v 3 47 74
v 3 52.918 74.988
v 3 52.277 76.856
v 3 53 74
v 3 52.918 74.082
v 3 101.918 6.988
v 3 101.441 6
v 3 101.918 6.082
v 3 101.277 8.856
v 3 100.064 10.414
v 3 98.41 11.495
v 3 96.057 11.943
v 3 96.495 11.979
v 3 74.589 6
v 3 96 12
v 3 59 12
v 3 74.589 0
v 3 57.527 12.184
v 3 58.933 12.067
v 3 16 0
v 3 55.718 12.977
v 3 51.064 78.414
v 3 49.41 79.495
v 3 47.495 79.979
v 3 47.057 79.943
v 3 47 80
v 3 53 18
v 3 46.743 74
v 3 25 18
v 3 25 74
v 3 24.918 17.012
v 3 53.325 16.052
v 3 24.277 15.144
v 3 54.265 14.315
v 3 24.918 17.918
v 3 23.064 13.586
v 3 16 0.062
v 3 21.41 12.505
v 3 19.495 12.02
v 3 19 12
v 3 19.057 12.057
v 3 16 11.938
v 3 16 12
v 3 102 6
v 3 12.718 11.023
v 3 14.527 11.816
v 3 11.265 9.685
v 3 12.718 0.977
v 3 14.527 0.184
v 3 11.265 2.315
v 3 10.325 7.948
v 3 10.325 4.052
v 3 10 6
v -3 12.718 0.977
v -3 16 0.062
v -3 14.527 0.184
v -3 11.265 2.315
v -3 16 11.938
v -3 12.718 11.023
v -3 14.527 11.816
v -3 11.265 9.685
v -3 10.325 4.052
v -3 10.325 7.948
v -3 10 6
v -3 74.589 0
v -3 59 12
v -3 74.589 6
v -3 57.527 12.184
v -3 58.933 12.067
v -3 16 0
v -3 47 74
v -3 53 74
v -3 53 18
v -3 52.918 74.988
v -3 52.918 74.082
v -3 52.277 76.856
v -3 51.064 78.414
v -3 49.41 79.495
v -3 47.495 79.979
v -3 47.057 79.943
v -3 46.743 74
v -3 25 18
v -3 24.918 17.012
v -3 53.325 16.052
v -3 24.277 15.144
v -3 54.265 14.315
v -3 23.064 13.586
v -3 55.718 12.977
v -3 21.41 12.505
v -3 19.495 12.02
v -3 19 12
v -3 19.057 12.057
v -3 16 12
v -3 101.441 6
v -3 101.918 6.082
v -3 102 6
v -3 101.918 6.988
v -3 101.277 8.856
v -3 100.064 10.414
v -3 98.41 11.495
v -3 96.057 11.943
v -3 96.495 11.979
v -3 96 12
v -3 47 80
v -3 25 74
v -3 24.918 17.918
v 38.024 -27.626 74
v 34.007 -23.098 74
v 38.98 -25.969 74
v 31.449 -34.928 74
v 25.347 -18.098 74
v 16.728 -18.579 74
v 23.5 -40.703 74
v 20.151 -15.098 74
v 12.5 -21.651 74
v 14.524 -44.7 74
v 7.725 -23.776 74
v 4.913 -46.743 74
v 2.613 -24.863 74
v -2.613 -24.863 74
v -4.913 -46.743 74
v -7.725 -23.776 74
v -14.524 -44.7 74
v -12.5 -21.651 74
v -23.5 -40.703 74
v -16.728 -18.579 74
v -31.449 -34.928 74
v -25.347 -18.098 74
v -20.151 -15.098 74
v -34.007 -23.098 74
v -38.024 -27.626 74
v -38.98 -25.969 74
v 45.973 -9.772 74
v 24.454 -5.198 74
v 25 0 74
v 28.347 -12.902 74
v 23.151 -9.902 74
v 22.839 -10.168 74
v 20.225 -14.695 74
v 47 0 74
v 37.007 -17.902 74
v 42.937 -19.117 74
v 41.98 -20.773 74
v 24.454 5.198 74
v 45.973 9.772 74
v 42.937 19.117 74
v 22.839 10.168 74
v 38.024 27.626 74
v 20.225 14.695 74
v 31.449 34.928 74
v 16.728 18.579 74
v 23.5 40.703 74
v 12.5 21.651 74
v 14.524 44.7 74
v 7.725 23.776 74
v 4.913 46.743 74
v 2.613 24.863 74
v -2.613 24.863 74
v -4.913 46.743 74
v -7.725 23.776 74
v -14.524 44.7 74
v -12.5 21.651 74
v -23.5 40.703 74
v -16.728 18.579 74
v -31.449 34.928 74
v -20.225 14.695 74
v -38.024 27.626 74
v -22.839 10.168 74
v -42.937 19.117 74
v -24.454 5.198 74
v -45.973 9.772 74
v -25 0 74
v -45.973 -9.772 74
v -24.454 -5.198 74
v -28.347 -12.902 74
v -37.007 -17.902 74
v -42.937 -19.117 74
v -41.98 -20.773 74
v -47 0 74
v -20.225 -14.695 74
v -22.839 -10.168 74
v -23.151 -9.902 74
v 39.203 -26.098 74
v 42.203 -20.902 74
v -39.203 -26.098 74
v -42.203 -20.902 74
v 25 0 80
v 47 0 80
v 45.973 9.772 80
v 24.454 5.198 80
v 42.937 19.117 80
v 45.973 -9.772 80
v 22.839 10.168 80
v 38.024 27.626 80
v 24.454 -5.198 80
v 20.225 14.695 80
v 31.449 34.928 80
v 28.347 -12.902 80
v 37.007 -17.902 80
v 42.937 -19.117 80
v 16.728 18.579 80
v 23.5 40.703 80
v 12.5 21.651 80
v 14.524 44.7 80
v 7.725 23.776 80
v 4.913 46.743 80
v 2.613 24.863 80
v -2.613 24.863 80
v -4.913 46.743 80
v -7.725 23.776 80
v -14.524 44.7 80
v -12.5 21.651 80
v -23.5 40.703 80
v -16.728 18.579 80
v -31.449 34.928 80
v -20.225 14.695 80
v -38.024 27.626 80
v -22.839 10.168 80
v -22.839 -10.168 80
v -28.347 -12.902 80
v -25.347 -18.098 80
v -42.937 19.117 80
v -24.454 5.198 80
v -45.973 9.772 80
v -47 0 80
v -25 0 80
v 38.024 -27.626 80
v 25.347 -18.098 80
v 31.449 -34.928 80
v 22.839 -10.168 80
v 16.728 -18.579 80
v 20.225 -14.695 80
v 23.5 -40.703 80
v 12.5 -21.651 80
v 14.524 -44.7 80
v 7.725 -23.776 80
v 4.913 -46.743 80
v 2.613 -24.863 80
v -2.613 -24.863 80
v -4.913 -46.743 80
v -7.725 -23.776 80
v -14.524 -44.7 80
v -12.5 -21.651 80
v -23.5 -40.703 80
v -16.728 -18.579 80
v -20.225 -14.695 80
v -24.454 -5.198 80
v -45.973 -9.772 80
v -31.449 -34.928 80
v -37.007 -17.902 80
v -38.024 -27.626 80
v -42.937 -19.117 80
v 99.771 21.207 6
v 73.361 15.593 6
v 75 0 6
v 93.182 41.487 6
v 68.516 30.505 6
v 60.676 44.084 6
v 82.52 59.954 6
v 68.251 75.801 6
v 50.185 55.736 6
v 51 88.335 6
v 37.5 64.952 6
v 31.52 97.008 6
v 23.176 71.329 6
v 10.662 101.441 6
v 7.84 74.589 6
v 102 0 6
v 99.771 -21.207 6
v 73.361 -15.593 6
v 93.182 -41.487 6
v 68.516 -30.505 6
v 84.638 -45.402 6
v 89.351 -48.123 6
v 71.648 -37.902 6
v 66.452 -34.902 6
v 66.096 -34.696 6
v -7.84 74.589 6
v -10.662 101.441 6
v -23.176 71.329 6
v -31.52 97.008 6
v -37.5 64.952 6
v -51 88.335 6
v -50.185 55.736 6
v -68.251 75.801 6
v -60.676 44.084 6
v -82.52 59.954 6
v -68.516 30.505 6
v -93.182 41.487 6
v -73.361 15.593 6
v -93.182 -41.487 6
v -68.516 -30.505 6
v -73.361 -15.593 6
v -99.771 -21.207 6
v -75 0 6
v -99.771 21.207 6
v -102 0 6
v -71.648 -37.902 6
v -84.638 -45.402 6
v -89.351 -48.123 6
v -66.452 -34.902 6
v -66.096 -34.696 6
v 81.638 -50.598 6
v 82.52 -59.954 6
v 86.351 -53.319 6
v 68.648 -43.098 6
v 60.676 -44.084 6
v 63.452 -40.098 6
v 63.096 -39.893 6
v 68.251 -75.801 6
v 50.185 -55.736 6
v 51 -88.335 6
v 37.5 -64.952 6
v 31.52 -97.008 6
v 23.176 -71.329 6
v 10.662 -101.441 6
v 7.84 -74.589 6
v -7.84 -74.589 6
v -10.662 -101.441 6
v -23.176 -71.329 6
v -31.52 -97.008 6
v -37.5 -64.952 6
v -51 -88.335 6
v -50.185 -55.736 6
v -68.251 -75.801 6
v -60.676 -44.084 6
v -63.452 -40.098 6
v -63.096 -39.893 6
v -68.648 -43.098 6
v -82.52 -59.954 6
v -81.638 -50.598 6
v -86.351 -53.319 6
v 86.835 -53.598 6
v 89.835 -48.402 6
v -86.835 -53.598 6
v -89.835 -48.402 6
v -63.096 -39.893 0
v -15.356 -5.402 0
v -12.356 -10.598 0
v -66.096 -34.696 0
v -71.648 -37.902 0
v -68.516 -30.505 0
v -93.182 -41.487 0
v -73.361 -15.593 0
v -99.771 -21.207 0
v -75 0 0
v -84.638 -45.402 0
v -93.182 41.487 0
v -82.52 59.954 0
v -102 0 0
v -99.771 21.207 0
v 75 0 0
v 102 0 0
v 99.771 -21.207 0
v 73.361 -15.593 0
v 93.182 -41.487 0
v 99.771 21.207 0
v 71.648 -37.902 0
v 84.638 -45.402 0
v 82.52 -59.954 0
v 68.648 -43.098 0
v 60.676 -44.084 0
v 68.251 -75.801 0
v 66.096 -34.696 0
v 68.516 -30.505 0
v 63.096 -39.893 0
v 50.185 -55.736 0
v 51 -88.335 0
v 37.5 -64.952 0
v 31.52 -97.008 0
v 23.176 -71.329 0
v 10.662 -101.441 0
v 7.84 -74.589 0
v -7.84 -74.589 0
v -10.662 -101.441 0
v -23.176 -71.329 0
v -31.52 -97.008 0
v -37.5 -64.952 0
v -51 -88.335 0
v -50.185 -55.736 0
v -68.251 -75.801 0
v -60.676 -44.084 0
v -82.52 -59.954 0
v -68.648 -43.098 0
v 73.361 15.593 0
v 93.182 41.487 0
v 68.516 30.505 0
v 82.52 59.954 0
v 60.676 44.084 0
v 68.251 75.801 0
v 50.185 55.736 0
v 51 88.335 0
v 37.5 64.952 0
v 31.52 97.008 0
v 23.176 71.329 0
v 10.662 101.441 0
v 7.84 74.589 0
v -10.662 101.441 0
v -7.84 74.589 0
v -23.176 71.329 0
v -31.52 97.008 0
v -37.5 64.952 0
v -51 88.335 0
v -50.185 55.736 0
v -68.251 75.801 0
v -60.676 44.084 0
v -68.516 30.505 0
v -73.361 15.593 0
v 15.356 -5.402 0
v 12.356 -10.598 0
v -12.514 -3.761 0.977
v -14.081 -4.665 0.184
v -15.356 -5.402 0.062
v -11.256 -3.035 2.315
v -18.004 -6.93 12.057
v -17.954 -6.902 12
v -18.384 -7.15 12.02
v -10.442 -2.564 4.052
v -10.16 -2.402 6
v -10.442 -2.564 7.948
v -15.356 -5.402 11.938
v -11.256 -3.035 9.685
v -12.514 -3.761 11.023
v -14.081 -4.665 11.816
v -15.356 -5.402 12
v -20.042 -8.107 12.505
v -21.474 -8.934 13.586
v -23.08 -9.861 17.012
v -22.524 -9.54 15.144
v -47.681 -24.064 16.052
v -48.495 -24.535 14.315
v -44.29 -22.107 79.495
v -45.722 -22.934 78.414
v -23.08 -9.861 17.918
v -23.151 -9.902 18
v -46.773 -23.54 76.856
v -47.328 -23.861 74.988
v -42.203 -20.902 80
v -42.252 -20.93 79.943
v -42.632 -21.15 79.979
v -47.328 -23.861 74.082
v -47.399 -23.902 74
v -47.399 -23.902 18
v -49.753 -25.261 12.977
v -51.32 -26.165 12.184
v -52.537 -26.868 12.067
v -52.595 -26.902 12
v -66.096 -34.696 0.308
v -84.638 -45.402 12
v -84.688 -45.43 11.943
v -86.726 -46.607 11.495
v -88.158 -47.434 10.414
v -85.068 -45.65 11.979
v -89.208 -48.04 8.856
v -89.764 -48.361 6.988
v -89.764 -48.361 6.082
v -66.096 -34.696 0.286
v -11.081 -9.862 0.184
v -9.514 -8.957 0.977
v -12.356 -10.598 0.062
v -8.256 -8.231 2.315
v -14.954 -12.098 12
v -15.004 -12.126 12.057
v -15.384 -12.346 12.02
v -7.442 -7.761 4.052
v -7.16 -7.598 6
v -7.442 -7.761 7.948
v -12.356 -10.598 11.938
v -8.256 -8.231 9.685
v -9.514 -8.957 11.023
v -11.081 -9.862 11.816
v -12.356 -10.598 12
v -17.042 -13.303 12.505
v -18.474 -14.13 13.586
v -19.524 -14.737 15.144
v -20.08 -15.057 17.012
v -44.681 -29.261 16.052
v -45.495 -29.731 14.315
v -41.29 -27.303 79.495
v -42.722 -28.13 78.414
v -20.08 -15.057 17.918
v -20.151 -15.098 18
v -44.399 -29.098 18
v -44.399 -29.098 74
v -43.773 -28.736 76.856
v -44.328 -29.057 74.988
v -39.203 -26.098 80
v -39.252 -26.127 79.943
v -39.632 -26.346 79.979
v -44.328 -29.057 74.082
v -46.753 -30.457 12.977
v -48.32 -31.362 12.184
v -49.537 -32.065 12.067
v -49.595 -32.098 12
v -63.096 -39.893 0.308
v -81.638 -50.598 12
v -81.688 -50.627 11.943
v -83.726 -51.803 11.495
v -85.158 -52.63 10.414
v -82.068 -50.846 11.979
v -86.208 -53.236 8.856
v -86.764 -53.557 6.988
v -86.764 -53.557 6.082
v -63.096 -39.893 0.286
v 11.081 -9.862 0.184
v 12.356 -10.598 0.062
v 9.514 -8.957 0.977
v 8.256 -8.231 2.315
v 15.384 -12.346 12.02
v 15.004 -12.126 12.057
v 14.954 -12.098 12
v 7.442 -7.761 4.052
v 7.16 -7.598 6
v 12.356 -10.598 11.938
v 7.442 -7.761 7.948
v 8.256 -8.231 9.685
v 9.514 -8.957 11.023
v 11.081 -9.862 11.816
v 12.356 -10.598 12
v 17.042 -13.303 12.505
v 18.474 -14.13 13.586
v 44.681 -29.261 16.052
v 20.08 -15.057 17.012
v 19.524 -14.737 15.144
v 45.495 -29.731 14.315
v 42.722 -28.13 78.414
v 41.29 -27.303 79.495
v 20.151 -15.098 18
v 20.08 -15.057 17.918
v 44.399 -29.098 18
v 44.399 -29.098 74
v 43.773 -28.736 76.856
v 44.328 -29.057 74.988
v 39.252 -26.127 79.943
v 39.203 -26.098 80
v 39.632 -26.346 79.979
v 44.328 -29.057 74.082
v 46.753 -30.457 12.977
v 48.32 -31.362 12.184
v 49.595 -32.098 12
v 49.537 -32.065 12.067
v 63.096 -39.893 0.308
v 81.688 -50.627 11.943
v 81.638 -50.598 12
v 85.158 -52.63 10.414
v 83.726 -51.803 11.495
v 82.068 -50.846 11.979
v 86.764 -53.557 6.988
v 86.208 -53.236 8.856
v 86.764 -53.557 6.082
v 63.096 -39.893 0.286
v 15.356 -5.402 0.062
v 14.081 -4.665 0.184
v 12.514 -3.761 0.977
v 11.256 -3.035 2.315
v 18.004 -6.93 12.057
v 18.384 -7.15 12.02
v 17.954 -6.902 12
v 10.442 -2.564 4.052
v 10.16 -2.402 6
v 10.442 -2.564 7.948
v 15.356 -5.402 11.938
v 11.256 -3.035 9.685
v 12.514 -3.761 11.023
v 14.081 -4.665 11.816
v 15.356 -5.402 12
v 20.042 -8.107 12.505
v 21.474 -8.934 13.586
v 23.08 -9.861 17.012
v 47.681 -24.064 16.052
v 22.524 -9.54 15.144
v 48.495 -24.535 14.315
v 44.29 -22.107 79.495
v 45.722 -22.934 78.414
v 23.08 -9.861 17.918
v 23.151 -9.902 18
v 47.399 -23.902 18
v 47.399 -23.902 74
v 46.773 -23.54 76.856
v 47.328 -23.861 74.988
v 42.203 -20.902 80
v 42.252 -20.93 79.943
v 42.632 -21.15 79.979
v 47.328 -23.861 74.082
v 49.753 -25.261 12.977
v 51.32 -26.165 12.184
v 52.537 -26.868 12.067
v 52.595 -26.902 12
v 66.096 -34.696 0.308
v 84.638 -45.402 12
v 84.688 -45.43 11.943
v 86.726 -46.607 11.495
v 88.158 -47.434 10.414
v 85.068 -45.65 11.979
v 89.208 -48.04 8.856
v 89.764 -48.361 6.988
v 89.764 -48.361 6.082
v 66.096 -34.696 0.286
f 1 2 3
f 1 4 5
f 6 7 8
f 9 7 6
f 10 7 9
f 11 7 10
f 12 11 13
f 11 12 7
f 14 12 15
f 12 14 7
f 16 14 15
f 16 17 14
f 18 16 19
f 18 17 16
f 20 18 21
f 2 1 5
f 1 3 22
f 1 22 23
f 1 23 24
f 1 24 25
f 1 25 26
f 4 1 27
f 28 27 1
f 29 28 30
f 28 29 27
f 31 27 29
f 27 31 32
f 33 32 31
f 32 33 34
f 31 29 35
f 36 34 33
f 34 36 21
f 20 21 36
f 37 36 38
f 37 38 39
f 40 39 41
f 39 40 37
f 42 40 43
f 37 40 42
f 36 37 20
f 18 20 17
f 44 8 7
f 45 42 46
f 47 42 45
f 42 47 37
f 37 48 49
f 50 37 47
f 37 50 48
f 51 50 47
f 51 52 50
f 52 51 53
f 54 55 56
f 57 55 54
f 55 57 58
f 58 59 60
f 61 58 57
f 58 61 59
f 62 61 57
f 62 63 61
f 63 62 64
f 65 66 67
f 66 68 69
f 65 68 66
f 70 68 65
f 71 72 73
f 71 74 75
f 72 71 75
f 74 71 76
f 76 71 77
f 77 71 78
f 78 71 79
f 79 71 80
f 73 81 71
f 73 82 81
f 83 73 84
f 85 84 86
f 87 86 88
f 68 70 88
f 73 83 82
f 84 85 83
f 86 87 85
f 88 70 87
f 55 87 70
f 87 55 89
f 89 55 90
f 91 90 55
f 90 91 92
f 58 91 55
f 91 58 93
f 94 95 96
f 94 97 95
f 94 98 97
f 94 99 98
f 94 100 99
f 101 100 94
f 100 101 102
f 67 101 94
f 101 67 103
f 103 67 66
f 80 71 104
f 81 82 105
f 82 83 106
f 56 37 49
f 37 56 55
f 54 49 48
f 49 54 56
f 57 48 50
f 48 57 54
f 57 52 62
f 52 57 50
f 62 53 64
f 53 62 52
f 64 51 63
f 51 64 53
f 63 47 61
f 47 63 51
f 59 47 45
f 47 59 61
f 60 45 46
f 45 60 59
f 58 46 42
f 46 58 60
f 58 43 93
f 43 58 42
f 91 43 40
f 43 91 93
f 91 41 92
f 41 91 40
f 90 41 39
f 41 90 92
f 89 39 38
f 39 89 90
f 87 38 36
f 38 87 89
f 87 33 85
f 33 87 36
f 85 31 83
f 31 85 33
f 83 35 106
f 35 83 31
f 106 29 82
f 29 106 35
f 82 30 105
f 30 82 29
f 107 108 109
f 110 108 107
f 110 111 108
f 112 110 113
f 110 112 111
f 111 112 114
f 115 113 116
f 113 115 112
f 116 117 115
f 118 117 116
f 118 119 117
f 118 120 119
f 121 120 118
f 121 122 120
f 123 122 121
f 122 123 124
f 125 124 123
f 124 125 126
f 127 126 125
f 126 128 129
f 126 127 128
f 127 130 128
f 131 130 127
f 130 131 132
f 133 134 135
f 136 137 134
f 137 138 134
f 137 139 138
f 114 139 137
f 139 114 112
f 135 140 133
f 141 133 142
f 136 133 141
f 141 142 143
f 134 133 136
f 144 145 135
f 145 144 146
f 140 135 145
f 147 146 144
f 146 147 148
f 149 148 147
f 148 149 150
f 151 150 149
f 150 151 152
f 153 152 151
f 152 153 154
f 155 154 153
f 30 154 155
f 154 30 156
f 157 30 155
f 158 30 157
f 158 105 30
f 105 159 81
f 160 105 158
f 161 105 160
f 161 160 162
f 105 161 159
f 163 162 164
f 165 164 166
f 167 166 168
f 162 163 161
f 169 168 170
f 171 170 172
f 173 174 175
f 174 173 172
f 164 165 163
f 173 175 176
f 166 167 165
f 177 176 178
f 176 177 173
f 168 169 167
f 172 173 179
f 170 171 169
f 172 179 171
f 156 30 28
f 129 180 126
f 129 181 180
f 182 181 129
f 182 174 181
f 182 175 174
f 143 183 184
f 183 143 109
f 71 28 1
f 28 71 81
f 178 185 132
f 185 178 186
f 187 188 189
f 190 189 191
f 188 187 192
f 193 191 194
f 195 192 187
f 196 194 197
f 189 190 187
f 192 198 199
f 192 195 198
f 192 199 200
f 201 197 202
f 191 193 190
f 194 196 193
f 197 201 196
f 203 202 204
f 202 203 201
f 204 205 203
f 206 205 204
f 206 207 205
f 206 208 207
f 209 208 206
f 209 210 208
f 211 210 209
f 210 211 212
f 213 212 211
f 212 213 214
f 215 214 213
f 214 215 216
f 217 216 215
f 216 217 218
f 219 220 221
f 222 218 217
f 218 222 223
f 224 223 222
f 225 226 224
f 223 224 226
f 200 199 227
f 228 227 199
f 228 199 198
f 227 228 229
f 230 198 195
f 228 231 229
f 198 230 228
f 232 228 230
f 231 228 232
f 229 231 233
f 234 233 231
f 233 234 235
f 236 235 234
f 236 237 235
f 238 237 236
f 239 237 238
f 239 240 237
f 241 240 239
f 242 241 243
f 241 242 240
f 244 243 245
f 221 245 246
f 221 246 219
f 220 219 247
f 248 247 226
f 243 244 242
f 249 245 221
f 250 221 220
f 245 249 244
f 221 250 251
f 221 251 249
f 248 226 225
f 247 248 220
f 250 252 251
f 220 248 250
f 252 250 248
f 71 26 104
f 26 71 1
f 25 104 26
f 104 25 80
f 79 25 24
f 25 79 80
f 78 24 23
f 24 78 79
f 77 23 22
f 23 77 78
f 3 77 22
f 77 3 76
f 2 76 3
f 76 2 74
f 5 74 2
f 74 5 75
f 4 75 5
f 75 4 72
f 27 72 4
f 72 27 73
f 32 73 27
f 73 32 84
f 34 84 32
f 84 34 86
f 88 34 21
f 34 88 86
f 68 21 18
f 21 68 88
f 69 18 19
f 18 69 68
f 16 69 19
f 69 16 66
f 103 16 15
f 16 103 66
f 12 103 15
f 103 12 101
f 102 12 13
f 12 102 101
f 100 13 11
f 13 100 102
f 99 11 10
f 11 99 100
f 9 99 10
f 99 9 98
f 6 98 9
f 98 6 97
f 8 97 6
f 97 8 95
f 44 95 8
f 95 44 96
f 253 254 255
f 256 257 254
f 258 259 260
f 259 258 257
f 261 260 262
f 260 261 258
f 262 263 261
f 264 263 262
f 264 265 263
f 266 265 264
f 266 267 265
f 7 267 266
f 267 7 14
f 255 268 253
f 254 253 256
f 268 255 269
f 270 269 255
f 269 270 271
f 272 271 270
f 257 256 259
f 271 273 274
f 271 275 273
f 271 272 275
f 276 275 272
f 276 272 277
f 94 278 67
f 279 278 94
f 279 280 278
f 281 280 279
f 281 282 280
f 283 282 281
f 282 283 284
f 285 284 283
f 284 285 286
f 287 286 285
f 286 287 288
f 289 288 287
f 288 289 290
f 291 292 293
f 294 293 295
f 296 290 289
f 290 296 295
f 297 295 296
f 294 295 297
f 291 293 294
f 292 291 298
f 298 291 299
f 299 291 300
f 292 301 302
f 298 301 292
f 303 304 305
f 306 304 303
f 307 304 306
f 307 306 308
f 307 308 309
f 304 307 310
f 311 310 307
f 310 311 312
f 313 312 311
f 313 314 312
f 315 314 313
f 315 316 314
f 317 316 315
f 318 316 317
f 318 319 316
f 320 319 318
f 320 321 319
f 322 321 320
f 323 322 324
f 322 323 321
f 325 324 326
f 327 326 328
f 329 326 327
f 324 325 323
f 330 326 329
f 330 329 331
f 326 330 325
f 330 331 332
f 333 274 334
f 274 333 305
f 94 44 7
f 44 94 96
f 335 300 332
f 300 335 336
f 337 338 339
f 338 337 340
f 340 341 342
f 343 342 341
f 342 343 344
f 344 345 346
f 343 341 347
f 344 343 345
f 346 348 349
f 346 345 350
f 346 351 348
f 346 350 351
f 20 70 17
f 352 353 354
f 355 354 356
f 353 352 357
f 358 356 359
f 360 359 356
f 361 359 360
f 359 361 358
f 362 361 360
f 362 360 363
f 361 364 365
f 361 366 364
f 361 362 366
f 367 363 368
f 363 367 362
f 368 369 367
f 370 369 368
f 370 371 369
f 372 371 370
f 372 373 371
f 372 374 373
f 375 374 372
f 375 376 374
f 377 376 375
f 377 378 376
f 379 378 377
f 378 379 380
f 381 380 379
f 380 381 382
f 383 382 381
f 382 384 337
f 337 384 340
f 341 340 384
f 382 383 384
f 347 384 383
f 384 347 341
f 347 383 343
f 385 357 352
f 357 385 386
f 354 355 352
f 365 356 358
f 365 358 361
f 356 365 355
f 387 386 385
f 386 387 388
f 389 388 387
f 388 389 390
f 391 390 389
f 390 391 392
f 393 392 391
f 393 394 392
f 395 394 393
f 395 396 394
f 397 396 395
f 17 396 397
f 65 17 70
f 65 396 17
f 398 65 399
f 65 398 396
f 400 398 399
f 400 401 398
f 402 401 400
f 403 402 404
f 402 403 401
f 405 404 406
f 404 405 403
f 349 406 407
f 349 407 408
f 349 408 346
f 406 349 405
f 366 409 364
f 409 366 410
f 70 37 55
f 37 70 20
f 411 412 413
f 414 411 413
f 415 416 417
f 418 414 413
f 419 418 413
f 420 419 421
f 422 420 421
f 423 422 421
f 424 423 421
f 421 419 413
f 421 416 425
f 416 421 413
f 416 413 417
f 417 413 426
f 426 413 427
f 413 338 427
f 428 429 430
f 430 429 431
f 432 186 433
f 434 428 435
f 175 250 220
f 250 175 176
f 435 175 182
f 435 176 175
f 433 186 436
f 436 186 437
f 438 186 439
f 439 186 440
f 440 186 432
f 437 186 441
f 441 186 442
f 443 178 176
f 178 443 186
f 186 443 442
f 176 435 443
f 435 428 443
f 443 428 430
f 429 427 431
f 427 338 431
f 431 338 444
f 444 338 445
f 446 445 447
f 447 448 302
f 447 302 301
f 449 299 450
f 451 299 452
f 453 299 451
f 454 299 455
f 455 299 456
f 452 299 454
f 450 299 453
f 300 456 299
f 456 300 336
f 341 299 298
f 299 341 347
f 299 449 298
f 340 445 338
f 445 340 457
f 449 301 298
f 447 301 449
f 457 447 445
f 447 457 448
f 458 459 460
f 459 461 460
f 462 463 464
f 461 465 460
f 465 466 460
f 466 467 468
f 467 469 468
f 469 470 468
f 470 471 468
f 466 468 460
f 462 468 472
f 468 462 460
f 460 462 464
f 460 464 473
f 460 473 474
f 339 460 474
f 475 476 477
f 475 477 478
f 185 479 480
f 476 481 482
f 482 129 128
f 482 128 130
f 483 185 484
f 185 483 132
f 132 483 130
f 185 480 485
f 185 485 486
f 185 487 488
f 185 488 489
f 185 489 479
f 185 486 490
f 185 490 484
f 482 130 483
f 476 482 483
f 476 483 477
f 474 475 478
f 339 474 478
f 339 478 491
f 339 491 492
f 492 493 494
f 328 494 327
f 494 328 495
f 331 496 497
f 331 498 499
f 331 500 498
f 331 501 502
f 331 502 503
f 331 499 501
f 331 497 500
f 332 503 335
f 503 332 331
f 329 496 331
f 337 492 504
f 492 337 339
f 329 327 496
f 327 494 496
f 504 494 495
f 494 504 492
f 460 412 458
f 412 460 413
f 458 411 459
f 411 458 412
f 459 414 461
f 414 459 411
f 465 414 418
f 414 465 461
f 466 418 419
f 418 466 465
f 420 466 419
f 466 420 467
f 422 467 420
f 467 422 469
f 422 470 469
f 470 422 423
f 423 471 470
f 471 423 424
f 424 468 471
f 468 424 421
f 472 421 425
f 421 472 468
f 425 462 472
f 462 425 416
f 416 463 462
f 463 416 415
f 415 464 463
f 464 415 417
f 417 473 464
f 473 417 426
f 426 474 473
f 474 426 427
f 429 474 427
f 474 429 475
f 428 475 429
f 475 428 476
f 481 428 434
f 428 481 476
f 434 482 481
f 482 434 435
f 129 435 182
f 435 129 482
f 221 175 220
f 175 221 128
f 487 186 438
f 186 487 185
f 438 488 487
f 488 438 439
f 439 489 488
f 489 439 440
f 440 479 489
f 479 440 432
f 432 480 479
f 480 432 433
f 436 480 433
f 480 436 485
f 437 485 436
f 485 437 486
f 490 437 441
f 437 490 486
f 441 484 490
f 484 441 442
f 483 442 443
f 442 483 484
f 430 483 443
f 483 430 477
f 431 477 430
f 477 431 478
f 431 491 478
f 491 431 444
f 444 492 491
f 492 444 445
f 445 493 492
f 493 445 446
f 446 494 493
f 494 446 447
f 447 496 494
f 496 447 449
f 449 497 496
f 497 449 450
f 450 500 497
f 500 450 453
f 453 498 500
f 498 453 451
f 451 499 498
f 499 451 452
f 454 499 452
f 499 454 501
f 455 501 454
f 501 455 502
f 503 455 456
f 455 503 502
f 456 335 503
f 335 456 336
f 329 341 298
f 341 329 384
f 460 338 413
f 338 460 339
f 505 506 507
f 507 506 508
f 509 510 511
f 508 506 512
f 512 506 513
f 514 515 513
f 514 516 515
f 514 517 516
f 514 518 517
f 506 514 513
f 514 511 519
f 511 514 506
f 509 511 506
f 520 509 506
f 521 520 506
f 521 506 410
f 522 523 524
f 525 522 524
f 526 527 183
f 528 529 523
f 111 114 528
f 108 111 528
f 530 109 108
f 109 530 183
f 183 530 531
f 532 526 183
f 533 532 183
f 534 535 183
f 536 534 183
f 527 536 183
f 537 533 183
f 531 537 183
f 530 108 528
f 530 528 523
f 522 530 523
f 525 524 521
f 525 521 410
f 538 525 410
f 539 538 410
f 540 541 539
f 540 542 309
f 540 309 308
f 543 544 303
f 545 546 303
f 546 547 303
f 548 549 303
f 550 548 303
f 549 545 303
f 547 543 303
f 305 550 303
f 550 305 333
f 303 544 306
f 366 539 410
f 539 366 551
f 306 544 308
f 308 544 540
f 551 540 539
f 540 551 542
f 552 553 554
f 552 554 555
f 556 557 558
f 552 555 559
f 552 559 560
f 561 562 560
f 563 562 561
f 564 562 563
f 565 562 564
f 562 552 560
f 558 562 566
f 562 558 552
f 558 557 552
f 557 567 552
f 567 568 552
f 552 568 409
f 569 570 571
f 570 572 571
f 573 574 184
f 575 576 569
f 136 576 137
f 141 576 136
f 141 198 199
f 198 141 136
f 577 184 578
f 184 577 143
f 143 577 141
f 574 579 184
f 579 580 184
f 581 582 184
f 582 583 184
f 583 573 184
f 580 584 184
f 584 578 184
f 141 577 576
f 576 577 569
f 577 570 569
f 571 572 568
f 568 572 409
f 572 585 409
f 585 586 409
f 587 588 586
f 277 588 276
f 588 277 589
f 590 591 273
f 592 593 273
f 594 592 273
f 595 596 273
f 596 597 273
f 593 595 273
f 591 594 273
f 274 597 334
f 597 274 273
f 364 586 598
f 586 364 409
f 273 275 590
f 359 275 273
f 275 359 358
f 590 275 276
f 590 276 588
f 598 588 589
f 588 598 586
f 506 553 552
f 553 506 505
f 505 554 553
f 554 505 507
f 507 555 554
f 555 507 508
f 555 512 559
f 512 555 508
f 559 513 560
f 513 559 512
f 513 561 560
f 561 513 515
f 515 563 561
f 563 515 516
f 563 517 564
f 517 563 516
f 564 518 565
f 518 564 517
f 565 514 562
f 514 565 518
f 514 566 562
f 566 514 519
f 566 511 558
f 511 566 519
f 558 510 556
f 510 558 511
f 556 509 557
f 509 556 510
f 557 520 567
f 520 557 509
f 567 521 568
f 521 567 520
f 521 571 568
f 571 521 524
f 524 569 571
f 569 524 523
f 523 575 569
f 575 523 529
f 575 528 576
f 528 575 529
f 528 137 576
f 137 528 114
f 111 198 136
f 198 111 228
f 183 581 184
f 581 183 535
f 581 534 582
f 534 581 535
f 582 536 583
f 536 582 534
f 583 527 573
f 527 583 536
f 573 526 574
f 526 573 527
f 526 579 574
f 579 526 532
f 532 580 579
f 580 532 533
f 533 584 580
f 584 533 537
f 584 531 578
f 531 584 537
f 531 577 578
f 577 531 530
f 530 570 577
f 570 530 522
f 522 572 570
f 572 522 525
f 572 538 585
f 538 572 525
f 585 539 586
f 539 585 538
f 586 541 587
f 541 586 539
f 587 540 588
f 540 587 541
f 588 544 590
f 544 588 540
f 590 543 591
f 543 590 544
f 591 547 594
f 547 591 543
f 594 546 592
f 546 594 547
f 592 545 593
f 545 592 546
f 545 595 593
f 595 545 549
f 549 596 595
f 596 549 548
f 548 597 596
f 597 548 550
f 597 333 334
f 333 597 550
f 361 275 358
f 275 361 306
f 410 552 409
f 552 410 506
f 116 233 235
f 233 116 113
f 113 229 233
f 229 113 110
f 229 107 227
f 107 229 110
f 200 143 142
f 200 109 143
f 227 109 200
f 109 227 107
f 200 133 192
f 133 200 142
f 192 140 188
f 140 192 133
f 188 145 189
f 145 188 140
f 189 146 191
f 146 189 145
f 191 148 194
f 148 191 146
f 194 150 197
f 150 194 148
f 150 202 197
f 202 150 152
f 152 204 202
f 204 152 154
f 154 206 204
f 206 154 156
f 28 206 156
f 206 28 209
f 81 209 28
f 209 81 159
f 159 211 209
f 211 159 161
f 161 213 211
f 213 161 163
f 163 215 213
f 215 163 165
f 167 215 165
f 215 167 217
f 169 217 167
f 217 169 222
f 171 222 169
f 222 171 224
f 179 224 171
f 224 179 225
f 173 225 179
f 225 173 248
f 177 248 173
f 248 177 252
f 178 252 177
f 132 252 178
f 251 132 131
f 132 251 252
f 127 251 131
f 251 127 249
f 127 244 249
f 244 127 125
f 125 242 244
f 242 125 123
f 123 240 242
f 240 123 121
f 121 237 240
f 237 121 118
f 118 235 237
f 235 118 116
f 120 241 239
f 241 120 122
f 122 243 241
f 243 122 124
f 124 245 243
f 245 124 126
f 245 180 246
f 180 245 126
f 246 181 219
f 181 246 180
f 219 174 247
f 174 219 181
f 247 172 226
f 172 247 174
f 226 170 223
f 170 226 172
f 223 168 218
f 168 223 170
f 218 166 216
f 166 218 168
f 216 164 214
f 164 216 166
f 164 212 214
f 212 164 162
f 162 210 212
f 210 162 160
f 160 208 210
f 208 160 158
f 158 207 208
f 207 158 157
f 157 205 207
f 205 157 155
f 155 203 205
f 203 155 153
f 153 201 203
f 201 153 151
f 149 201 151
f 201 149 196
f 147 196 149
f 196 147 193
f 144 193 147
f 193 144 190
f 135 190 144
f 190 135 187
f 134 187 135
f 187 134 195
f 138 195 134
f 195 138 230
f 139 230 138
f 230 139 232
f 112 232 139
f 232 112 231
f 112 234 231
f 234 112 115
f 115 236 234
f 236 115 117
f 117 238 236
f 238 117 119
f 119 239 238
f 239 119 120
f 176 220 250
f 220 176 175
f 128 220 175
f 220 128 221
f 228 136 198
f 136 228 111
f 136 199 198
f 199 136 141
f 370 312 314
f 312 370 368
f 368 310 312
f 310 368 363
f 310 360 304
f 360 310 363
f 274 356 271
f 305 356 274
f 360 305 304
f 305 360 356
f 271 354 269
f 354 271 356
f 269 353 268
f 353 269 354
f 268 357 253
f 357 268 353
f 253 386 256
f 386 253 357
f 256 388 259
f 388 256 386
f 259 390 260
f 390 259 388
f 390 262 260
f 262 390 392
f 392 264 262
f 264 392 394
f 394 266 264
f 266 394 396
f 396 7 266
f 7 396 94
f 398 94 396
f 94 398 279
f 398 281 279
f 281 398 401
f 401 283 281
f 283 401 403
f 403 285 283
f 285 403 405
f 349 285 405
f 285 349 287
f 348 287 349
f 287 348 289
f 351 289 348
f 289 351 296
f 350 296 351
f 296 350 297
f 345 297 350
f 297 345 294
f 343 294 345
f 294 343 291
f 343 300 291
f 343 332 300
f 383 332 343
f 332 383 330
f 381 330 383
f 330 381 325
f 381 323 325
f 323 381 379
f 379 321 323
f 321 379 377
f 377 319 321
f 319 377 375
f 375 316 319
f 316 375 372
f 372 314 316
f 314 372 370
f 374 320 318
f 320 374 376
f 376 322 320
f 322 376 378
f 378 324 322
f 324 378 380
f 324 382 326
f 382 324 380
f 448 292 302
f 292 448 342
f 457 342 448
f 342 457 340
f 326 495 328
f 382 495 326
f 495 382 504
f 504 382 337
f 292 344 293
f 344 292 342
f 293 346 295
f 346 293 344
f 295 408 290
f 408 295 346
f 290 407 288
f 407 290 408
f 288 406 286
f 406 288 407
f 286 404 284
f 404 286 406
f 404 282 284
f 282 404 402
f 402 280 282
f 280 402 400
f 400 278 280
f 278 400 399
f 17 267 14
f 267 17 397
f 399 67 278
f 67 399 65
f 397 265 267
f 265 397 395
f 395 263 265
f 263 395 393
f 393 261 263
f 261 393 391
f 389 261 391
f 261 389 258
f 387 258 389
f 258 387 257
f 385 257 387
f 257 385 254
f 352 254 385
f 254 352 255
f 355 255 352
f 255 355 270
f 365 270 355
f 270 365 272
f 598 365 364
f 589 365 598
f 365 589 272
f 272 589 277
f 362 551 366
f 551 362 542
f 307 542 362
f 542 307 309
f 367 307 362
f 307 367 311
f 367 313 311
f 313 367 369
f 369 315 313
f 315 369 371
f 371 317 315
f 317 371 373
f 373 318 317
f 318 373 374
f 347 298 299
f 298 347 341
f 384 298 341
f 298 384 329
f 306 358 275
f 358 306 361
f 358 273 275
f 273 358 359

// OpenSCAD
// To render the DXF file from the command line:
// openscad -o example017.dxf -D'mode="parts"' example017.scad

// mode = "parts";
// mode = "exploded";
mode = "assembled";

thickness = 6;
locklen1 = 15;
locklen2 = 10;
boltlen = 15;
midhole = 10;
inner1_to_inner2 = 50;
total_height = 80;

module shape_tripod()
{
  x1 = 0;
  x2 = x1 + thickness;
  x3 = x2 + locklen1;
  x4 = x3 + thickness;
  x5 = x4 + inner1_to_inner2;
  x6 = x5 - thickness;
  x7 = x6 - locklen2;
  x8 = x7 - thickness;
  x9 = x8 - thickness;
  x10 = x9 - thickness;
  
  y1 = 0;
  y2 = y1 + thickness;
  y3 = y2 + thickness;
  y4 = y3 + thickness;
  y5 = y3 + total_height - 3*thickness;
  y6 = y5 + thickness;
  
  union() {
    difference() {
      polygon([
        [ x1, y2 ], [ x2, y2 ],
        [ x2, y1 ], [ x3, y1 ], [ x3, y2 ],
        [ x4, y2 ], [ x4, y1 ], [ x5, y1 ],
        [ x5 + thickness, y3 ], [ x5, y4 ],
        [ x5, y5 ],
        [ x6, y5 ], [ x6, y6 ], [ x7, y6 ], [ x7, y5 ], [ x8, y5 ],
        [ x8, y6 ], [ x9, y5 ],
        [ x9, y4 ], [ x10, y3 ],
        [ x2, y3 ]
      ]);
      translate([ x10, y4 ]) circle(thickness);
      translate([ x5 + thickness, y4 ]) circle(thickness);
    }
  
    translate([ x5, y1 ]) square([ boltlen - thickness, thickness*2 ]);
  
    translate([ x5 + boltlen - thickness, y2 ]) circle(thickness);
  
    translate([ x2, y2 ]) intersection() {
      circle(thickness);
      translate([ -thickness*2, 0 ]) square(thickness*2);
    }
  
    translate([ x8, y5 ]) intersection() {
      circle(thickness);
      translate([ -thickness*2, 0 ]) square(thickness*2);
    }
  }
}

module shape_inner_disc()
{
  difference() {
    circle(midhole + boltlen + 2*thickness + locklen2);
    for (alpha = [ 0, 120, 240 ]) {
      rotate(alpha) translate([ 0, midhole + boltlen + thickness + locklen2/2 ]) square([ thickness, locklen2 ], true);
    }
    circle(midhole + boltlen);
  }
}

module shape_outer_disc()
{
  difference() {
    circle(midhole + boltlen + inner1_to_inner2 + 2*thickness + locklen1);
    for (alpha = [ 0, 120, 240 ]) {
      rotate(alpha) translate([ 0, midhole + boltlen + inner1_to_inner2 + thickness + locklen1/2 ]) square([ thickness, locklen1 ], true);
    }
    circle(midhole + boltlen + inner1_to_inner2);
  }
}

module parts()
{
  tripod_x_off = locklen1 - locklen2 + inner1_to_inner2;
  tripod_y_off = max(midhole + boltlen + inner1_to_inner2 + 4*thickness + locklen1, total_height);

  shape_inner_disc();
  shape_outer_disc();

  for (s = [ [1,1], [-1,1], [1,-1] ]) {
    scale(s) translate([ tripod_x_off, -tripod_y_off ]) shape_tripod();
  }
}

module exploded()
{
  translate([ 0, 0, total_height + 2*thickness ]) linear_extrude(height = thickness, convexity = 4) shape_inner_disc();
  linear_extrude(height = thickness, convexity = 4) shape_outer_disc();

  color([ 0.7, 0.7, 1 ]) for (alpha = [ 0, 120, 240 ]) {
    rotate(alpha)
      translate([ 0, thickness*2 + locklen1 + inner1_to_inner2 + boltlen + midhole, 1.5*thickness ])
        rotate([ 90, 0, -90 ])
          linear_extrude(height = thickness, convexity = 10, center = true) shape_tripod();
  }
}

module bottle()
{
  r = boltlen + midhole;
  h = total_height - thickness*2;

  rotate_extrude(convexity = 2) {
    square([ r, h ]);

    translate([ 0, h ]) {
      intersection() {
        square([ r, r ]);
        scale([ 1, 0.7 ]) circle(r);
      }
    }
    translate([ 0, h+r ]) {
      intersection() {
        translate([ 0, -r/2 ]) square([ r/2, r ]);
        circle(r/2);
      }
    }
  }
}

module assembled()
{
  translate([ 0, 0, total_height - thickness ]) linear_extrude(height = thickness, convexity = 4) shape_inner_disc();
  linear_extrude(height = thickness, convexity = 4) shape_outer_disc();

  color([ 0.7, 0.7, 1 ]) for (alpha = [ 0, 120, 240 ]) {
    rotate(alpha)
      translate([ 0, thickness*2 + locklen1 + inner1_to_inner2 + boltlen + midhole, 0 ])
        rotate([ 90, 0, -90 ])
          linear_extrude(height = thickness, convexity = 10, center = true) shape_tripod();
  }

  % translate([ 0, 0, thickness*2]) bottle();
}

echo(version=version());

if (mode == "parts") parts();

if (mode == "exploded") exploded();

if (mode == "assembled") assembled();

// Written by Clifford Wolf <clifford@clifford.at> and Marius
// Kintel <marius@kintel.net>
//
// To the extent possible under law, the author(s) have dedicated all
// copyright and related and neighboring rights to this software to the
// public domain worldwide. This software is distributed without any
// warranty.
//
// You should have received a copy of the CC0 Public Domain
// Dedication along with this software.
// If not, see <http://creativecommons.org/publicdomain/zero/1.0/>.
